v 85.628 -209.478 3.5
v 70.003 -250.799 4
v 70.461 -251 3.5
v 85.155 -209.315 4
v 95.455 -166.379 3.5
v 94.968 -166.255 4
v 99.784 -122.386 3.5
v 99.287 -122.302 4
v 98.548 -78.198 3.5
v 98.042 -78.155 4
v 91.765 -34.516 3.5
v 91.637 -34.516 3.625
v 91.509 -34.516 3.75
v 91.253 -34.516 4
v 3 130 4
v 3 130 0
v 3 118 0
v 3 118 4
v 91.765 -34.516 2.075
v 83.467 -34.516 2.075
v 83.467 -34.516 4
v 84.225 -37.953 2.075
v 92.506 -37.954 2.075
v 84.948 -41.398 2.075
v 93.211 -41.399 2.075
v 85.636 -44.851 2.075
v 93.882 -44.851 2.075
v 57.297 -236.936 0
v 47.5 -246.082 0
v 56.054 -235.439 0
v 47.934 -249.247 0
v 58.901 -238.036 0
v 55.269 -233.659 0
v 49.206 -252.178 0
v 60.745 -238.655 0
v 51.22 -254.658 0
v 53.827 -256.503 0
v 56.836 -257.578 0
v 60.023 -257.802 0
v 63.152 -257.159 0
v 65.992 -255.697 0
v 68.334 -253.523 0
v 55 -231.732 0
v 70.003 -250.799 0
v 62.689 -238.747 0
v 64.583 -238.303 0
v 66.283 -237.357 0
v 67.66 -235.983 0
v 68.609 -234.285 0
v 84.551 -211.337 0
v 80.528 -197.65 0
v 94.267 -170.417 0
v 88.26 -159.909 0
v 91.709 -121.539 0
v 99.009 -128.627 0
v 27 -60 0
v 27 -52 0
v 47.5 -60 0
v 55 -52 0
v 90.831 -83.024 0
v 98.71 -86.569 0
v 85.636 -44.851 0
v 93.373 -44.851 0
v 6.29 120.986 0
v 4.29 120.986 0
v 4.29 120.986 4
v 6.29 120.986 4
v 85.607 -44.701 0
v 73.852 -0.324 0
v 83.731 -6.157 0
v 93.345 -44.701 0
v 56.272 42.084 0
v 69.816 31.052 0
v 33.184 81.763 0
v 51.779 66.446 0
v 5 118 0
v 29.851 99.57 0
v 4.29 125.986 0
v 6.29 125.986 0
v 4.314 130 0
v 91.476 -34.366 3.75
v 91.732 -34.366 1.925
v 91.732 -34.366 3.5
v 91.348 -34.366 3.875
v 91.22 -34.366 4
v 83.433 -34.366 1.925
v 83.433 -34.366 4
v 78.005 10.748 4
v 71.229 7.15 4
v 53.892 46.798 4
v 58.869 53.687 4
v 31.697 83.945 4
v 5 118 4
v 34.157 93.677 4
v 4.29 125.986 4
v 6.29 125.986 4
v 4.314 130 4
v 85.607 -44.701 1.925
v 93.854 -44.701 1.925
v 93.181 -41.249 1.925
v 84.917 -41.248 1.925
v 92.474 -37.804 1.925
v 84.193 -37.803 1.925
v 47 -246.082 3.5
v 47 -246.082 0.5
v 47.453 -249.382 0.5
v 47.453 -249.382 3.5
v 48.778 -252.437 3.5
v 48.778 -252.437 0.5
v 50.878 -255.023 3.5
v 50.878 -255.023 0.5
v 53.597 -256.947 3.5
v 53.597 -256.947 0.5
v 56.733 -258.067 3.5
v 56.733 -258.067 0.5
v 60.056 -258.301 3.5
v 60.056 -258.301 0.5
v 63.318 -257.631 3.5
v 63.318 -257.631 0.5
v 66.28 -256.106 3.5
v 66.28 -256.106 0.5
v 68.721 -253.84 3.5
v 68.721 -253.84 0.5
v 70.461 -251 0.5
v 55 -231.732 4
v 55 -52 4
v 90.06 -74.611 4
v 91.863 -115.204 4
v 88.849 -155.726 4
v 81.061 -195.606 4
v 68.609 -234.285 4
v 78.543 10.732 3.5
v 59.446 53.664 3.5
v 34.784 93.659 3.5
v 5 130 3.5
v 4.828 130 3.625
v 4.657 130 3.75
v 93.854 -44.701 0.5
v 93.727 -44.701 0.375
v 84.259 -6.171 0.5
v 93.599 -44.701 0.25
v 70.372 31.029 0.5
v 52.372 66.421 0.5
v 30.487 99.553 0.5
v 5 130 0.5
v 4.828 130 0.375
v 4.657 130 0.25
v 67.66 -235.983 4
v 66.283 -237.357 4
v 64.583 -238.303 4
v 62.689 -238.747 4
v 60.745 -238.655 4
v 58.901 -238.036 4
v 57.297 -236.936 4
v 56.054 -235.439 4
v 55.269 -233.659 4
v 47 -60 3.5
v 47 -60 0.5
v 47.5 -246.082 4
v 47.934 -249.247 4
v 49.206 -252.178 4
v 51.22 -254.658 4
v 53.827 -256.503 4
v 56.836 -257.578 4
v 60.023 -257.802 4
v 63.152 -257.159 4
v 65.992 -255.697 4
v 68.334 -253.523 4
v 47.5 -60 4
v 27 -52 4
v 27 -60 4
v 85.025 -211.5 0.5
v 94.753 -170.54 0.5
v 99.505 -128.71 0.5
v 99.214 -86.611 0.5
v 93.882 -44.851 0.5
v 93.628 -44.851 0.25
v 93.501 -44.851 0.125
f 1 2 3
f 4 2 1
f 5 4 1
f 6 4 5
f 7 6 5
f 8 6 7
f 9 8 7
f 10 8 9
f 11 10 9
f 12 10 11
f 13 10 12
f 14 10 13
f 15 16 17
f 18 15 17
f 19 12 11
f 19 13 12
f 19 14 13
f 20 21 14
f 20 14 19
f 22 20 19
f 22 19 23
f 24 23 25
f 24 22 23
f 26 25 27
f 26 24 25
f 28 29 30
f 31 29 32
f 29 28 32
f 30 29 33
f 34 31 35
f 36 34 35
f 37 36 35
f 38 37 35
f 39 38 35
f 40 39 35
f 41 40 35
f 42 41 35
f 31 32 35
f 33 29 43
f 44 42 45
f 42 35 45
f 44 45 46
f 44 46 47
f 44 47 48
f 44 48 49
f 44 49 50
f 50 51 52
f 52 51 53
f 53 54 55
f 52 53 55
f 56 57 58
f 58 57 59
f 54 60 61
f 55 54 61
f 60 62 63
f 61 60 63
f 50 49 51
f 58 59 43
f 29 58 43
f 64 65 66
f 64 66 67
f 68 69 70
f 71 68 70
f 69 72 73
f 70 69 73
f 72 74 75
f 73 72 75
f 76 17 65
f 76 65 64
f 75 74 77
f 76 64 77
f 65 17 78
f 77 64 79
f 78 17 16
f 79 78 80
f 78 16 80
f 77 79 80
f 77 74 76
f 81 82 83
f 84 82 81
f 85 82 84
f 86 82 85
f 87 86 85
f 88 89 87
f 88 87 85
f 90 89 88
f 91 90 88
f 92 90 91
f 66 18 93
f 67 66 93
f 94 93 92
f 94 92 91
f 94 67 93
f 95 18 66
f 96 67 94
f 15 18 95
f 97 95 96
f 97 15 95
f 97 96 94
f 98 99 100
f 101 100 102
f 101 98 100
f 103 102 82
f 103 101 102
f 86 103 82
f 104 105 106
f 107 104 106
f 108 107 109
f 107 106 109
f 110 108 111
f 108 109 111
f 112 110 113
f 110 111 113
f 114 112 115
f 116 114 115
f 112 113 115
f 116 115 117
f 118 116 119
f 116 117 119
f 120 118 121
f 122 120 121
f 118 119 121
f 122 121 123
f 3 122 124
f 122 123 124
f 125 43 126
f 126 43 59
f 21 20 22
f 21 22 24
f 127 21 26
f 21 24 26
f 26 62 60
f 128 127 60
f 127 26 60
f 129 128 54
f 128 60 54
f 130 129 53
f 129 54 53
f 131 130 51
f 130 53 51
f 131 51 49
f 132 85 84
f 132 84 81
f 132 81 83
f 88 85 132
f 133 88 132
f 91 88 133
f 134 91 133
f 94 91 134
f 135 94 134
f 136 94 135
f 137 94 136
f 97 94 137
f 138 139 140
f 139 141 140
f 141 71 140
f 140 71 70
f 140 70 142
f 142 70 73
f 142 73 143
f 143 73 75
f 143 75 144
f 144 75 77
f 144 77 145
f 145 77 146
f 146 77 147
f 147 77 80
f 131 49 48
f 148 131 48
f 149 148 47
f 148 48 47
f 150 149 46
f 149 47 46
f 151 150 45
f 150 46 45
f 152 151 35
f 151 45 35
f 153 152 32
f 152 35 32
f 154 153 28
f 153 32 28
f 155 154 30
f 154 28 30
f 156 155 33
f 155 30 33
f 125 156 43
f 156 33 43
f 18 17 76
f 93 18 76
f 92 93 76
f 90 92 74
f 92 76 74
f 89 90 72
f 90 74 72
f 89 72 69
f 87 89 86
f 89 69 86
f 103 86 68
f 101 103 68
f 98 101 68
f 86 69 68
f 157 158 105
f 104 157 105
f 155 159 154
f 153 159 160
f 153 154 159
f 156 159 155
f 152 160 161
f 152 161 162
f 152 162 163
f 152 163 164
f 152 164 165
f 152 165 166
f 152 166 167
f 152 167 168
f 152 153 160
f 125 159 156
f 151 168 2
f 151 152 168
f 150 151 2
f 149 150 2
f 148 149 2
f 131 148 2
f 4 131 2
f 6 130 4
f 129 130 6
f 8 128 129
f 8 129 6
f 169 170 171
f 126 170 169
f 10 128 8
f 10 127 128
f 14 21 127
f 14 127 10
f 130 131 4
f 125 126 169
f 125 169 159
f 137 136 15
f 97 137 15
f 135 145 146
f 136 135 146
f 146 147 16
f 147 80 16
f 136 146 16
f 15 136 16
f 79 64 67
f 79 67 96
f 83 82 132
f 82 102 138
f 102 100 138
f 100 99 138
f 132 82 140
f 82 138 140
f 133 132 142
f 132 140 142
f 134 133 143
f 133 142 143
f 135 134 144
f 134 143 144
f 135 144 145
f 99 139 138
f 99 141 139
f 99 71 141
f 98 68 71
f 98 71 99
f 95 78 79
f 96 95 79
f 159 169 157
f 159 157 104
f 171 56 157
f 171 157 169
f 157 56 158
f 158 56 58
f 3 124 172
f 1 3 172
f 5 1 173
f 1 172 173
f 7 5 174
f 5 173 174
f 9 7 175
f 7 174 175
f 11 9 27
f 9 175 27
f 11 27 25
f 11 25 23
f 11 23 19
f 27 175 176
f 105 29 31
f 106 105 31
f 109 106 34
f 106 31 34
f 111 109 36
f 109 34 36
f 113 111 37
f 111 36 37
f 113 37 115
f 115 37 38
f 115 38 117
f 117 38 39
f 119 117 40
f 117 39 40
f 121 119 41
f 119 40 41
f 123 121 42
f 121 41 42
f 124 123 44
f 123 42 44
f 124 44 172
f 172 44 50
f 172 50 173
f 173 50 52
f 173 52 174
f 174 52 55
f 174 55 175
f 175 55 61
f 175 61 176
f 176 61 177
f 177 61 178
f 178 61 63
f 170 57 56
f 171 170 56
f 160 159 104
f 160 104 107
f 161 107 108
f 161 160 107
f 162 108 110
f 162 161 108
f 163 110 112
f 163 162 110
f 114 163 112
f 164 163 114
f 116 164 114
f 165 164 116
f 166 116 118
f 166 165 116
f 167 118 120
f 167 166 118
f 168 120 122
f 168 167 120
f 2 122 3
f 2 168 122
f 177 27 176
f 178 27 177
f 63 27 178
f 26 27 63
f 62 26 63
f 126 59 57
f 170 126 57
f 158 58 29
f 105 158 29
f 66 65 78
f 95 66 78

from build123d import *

# Parameters (mm, degrees)
F0_W     = 2
F0_H     = 5
F1_DEPTH = 4
F2_SIZE  = 0.5
F4_DEPTH = 150


with BuildPart() as f1:
    # F0 (on Top) → F1 (new body)
    with BuildSketch(Plane.XY):
        with BuildLine():
            Line((27, -52), (27, -60))
            Line((27, -60), (47, -60))
            Line((47, -60), (47, -246.082022))
            ThreePointArc((47, -246.082022), (56.733311, -258.067263), (70.460551, -251))
            ThreePointArc((70.460551, -251), (94.933072, -50.671846), (5, 130))
            Line((5, 130), (3, 130))
            Line((3, 130), (3, 118))
            Line((3, 118), (5, 118))
            ThreePointArc((5, 118), (86.446116, -49.178947), (68.608857, -234.284599))
            ThreePointArc((68.608857, -234.284599), (60.745411, -238.65548), (55, -231.732429))
            Line((55, -231.732429), (55, -52))
            Line((55, -52), (27, -52))
        make_face()
        with Locations((5.290123, 123.486417)):
            Rectangle(F0_W, F0_H, mode=Mode.SUBTRACT)
    extrude(amount=F1_DEPTH)

    # F2
    f2_edges = [f1.edges().sort_by_distance(p)[0] for p in [
        (94.933072, -50.671846, 0),
        (94.933072, -50.671846, 4),
    ]]
    chamfer(f2_edges, length=F2_SIZE)

    # F3 (on Right) → F4 (cut)
    with BuildSketch(Plane.YZ):
        Polygon((-44.850904, 2.075), (-44.850904, 0), (-44.700904, 0), (-44.700904, 1.925), (-34.365721, 1.925), (-34.365721, 4), (-34.515721, 4), (-34.515721, 2.075), align=None)
    extrude(amount=F4_DEPTH, mode=Mode.SUBTRACT)


solid = f1.part
